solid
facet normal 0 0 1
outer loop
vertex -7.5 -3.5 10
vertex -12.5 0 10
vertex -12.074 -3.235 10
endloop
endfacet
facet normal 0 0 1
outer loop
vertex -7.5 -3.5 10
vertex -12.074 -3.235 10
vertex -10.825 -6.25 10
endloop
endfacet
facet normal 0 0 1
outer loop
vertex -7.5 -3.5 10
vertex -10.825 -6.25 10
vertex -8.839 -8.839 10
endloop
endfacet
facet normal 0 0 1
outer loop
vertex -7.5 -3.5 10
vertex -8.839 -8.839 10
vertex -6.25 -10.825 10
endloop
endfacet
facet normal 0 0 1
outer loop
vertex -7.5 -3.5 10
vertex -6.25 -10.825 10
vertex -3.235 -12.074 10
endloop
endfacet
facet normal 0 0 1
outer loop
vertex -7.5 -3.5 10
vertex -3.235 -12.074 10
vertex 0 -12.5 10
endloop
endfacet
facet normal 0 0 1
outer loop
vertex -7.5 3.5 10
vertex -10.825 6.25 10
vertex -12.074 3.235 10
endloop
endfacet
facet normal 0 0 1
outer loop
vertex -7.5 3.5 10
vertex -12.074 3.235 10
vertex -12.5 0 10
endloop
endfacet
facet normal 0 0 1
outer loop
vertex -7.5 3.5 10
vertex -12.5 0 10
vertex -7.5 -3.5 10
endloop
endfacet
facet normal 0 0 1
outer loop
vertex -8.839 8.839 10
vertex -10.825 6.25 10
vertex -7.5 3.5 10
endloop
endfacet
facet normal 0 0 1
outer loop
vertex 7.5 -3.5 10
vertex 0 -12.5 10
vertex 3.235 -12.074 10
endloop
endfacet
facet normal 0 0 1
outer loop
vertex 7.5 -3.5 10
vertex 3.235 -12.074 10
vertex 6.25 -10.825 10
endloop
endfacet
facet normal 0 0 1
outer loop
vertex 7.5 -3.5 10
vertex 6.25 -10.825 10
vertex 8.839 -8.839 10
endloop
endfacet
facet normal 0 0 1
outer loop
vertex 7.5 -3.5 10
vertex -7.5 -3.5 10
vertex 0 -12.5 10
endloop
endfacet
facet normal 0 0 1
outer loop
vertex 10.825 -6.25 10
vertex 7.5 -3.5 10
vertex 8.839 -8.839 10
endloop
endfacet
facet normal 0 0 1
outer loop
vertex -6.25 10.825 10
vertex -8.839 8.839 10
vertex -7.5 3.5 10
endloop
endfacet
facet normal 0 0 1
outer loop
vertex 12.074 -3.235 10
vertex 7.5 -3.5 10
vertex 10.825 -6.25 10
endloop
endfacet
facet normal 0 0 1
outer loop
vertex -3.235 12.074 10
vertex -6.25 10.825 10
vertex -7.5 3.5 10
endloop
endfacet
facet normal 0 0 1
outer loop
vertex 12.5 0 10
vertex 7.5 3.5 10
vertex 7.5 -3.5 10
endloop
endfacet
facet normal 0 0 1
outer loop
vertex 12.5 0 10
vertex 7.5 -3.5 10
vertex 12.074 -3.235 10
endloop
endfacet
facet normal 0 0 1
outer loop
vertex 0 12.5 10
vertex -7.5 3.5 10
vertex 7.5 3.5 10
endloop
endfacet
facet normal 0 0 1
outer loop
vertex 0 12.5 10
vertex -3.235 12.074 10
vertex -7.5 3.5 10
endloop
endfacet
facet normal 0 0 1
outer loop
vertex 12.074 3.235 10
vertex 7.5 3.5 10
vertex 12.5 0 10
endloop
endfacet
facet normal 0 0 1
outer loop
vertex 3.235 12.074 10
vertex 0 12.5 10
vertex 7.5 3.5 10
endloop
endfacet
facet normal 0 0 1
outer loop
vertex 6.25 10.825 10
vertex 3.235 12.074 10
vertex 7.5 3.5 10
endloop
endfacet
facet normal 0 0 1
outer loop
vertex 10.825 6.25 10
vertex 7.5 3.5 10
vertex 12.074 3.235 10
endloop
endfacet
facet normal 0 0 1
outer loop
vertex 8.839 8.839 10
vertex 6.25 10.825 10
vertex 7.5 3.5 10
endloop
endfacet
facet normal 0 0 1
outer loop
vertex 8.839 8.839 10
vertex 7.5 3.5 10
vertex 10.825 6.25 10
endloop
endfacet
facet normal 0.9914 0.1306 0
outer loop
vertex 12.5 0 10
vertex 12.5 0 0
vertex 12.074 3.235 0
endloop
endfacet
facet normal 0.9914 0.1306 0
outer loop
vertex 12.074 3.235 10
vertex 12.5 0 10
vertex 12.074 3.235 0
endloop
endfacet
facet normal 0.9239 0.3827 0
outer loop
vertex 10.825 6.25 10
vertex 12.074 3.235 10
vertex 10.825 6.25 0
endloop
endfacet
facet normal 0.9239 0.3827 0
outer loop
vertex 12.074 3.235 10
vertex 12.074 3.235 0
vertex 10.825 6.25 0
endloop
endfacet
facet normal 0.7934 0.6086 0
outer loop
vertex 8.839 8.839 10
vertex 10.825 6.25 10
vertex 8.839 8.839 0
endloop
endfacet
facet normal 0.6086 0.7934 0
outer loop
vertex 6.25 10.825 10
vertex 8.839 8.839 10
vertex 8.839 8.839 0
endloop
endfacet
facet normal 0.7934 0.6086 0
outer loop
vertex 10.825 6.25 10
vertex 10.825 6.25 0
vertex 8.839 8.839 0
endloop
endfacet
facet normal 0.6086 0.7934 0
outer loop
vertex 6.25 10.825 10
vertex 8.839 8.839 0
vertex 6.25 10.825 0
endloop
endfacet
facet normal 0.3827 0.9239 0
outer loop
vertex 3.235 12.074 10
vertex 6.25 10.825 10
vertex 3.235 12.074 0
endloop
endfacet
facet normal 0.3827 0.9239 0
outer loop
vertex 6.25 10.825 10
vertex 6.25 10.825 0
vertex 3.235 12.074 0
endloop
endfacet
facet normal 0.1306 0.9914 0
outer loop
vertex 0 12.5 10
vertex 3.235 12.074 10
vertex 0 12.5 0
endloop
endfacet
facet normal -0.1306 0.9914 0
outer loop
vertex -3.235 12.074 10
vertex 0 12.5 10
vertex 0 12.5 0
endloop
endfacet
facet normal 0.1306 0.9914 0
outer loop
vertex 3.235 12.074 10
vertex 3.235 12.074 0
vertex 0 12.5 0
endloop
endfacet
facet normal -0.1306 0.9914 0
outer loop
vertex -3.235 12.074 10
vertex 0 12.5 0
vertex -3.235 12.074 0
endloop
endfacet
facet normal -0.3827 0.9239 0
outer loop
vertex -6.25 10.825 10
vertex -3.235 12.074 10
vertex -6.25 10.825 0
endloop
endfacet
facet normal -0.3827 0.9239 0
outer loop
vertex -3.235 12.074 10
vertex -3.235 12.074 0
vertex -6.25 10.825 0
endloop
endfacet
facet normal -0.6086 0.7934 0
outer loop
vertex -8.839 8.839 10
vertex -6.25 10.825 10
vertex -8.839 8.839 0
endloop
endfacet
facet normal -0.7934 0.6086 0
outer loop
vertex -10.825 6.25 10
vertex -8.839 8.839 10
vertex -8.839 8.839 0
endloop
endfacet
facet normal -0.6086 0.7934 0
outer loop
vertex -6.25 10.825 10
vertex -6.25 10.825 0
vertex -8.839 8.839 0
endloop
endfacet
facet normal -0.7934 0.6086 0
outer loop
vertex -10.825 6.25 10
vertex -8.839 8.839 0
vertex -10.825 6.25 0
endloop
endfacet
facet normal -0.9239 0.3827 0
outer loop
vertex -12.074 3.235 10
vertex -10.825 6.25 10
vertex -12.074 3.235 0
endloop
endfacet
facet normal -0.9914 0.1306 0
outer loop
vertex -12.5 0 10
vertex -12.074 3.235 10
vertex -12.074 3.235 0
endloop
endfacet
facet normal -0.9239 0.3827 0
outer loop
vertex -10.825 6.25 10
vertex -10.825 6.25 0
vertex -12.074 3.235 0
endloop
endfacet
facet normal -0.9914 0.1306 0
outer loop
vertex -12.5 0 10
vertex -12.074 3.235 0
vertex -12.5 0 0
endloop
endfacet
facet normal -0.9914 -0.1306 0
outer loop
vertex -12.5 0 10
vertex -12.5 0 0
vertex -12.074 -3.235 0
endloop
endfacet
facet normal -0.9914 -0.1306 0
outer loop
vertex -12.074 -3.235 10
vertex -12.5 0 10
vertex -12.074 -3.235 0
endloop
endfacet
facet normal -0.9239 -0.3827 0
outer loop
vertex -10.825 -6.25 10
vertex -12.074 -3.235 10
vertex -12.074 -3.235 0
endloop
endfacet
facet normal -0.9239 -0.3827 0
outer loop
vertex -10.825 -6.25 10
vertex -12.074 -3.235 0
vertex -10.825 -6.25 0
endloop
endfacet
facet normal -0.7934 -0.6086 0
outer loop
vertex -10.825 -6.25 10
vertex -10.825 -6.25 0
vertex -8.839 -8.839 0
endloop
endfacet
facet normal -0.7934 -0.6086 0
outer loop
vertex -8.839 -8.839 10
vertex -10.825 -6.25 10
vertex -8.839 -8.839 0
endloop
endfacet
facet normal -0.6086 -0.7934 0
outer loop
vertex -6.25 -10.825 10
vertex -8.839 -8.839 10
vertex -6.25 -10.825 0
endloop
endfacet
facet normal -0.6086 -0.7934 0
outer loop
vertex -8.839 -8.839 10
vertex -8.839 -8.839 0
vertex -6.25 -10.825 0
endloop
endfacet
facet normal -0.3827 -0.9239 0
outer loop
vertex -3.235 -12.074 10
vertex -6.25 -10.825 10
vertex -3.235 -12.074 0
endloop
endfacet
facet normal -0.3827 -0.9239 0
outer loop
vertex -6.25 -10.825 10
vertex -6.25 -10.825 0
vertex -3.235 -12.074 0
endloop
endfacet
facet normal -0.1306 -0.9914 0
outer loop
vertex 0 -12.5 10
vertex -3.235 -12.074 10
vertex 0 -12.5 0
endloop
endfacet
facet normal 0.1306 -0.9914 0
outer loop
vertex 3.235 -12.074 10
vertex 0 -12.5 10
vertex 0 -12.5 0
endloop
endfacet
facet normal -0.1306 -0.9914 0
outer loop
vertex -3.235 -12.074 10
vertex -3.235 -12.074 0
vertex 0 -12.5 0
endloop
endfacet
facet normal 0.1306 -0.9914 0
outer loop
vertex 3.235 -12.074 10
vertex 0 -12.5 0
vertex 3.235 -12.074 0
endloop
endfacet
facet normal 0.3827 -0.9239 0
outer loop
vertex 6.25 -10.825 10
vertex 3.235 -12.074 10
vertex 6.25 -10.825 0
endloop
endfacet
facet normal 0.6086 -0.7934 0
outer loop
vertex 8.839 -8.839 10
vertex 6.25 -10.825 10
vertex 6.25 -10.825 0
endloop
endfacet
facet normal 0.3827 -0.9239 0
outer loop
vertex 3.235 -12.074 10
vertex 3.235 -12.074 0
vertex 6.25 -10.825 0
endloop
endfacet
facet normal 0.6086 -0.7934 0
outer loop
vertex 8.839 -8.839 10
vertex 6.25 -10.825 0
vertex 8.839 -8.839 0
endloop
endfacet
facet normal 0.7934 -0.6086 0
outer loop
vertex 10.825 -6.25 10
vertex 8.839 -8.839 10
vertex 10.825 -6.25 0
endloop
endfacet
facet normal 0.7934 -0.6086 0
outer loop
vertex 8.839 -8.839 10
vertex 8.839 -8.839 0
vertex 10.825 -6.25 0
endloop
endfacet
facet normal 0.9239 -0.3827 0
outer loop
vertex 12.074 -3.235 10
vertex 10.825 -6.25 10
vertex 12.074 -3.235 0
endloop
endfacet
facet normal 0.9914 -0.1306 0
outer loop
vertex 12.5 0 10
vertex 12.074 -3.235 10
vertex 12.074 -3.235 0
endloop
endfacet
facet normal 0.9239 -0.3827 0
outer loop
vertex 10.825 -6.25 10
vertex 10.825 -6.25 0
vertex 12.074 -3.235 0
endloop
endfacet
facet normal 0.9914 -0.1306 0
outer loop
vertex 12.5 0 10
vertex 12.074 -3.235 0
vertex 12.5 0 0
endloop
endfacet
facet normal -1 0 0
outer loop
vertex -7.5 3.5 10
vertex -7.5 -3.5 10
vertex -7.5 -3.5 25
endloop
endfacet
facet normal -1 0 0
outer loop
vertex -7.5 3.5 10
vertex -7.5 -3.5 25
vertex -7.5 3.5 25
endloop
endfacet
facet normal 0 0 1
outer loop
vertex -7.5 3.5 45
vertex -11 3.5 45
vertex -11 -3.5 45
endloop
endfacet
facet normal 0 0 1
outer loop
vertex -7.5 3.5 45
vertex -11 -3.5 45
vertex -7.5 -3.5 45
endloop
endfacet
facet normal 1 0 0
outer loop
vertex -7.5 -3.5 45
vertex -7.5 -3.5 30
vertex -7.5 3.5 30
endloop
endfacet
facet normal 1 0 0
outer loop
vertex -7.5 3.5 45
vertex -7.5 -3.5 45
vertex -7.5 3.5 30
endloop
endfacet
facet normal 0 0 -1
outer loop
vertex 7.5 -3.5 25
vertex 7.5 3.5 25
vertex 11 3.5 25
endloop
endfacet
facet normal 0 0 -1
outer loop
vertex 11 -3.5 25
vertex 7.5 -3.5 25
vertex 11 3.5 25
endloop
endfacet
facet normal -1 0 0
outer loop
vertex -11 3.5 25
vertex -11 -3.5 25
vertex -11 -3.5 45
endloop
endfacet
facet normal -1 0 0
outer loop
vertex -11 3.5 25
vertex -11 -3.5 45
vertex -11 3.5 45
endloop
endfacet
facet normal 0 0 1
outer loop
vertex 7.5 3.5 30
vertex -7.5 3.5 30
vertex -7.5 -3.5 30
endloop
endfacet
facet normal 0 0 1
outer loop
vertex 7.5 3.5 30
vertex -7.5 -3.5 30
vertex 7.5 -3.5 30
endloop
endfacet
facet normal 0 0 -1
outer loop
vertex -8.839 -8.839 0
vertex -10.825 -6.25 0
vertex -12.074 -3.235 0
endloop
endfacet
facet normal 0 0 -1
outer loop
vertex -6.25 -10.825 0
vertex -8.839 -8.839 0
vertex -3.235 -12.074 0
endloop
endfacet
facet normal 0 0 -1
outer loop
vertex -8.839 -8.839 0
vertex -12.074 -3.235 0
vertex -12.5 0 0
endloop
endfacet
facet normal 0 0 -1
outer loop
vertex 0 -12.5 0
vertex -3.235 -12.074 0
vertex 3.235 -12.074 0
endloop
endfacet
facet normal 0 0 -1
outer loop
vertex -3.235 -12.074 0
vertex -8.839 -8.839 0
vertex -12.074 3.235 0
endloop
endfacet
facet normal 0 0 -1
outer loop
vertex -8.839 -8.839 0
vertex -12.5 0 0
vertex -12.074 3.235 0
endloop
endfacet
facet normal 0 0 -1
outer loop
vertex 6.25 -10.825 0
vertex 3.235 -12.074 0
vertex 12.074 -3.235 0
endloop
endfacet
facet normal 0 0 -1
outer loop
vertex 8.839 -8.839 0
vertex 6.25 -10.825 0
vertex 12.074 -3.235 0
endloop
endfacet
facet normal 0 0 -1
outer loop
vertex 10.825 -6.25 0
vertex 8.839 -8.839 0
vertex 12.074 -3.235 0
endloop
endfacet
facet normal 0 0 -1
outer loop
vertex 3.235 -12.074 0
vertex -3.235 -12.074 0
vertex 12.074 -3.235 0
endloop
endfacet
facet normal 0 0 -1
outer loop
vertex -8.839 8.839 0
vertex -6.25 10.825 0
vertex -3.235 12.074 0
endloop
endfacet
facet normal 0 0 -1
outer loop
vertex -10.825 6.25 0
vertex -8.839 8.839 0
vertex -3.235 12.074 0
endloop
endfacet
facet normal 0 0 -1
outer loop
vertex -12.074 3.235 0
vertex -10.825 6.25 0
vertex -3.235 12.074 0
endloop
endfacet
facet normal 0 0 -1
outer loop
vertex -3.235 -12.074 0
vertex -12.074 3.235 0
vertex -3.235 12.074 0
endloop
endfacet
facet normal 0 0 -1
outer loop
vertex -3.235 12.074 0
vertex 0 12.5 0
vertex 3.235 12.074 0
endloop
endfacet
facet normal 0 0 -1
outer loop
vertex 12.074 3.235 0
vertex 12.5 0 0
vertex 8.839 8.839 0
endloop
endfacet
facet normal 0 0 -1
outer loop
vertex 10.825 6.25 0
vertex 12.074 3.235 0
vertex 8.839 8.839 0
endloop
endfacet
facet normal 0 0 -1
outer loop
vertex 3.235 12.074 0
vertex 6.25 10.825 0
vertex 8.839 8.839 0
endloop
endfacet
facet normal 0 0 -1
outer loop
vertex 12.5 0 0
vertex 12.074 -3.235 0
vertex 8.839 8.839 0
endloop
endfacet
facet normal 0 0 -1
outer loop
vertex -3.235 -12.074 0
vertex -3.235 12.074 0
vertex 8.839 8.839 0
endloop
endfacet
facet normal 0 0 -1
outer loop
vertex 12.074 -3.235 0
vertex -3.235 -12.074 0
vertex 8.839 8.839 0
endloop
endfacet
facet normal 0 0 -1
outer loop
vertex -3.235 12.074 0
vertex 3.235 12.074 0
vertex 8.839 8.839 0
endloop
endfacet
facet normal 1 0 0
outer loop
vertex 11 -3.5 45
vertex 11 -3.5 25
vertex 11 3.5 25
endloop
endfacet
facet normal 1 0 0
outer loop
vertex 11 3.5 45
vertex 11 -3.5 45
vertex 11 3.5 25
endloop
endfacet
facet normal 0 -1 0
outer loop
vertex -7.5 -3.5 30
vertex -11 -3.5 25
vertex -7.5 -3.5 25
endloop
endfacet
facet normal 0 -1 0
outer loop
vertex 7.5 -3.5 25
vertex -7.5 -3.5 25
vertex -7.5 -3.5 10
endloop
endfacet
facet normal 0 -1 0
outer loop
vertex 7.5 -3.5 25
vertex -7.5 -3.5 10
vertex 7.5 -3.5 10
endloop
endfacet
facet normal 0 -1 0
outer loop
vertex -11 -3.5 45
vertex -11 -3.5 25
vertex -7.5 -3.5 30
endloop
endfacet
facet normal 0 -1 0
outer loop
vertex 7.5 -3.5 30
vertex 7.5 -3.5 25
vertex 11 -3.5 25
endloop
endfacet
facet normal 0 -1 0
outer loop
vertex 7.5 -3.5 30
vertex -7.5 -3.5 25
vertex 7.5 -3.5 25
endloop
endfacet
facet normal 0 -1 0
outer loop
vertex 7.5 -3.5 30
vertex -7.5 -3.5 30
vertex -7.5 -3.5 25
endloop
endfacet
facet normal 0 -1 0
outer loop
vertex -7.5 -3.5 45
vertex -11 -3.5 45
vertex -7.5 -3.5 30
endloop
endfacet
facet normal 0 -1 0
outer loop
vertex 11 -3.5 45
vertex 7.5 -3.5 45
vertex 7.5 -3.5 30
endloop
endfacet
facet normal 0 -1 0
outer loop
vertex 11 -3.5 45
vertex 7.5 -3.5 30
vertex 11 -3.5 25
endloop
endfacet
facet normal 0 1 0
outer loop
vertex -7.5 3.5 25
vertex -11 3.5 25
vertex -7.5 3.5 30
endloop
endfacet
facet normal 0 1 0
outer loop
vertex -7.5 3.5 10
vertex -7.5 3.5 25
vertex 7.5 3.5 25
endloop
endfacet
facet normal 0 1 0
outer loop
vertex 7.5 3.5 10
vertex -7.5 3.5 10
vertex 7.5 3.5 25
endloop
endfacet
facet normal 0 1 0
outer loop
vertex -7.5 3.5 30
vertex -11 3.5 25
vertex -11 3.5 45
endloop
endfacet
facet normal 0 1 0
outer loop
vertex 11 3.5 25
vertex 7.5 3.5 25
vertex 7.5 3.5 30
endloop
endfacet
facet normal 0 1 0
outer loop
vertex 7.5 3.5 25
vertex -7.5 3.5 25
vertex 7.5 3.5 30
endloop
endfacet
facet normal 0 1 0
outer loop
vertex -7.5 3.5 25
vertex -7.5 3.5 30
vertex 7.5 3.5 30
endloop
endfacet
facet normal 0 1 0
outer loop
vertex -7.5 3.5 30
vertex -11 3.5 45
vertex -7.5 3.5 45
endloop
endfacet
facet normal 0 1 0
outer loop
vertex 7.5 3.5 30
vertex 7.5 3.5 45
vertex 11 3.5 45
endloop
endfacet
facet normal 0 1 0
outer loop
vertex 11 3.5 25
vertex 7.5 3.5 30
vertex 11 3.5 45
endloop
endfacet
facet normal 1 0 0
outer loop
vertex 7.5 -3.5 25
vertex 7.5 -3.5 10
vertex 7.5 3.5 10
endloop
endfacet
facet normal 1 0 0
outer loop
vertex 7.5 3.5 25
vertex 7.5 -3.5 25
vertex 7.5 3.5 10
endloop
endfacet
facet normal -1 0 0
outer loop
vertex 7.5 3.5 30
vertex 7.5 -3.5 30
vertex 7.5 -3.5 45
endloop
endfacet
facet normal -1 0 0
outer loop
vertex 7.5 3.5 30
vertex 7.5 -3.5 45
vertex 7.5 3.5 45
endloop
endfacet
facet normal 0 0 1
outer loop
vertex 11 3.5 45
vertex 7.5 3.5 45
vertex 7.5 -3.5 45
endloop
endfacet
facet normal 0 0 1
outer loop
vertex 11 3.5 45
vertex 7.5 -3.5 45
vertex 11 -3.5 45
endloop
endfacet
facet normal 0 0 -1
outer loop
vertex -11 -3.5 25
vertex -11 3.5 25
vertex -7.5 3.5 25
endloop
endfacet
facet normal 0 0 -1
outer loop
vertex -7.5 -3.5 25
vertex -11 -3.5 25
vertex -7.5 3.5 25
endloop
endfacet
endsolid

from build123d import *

# Parameters (mm, degrees)
SKETCH1_R             = 12.5
BOSS_EXTRUDE1_DEPTH   = 10
SKETCH2_W             = 15
SKETCH2_H             = 7
BOSS_EXTRUDE2_DEPTH   = 20
SKETCH3_W             = 3.5
SKETCH3_H             = 7
BOSS_EXTRUDE4_DEPTH   = 15
BOSS_EXTRUDE4_2_DEPTH = 15
SKETCH3_4_W           = 3.5
SKETCH3_4_H           = 7
BOSS_EXTRUDE5_DEPTH   = 5


with BuildPart() as part:
    # Sketch1 → Boss-Extrude1 (new body)
    with BuildSketch(Plane.XY):
        Circle(SKETCH1_R)
    extrude(amount=BOSS_EXTRUDE1_DEPTH)

    # Sketch2 → Boss-Extrude2 (add)
    with BuildSketch(Plane.XY.offset(10)):
        Rectangle(SKETCH2_W, SKETCH2_H)
    extrude(amount=BOSS_EXTRUDE2_DEPTH)



with BuildPart() as body_2:
    # Sketch3 → Boss-Extrude4 (new body)
    with BuildSketch(Plane.XY.offset(30)):
        with Locations((-9.25, 0)):
            Rectangle(SKETCH3_W, SKETCH3_H)
    extrude(amount=BOSS_EXTRUDE4_DEPTH)


with BuildPart() as body_3:
    # Sketch3 → Boss-Extrude4 2 (new body)
    with BuildSketch(Plane.XY.offset(30)):
        with Locations((9.25, 0)):
            Rectangle(SKETCH3_W, SKETCH3_H)
    extrude(amount=BOSS_EXTRUDE4_2_DEPTH)


with BuildPart() as part_1:
    add(part.part)

    add(body_2.part)  # Boss-Extrude5 merges body 2

    add(body_3.part)  # Boss-Extrude5 merges body 3
    # Sketch3<4> → Boss-Extrude5 (add)
    with BuildSketch(Plane.XY.offset(30)):
        with Locations((-9.25, 0)):
            Rectangle(SKETCH3_4_W, SKETCH3_4_H)
        with Locations((9.25, 0)):
            Rectangle(SKETCH3_4_W, SKETCH3_4_H)
    extrude(amount=-BOSS_EXTRUDE5_DEPTH)


solid = part_1.part
